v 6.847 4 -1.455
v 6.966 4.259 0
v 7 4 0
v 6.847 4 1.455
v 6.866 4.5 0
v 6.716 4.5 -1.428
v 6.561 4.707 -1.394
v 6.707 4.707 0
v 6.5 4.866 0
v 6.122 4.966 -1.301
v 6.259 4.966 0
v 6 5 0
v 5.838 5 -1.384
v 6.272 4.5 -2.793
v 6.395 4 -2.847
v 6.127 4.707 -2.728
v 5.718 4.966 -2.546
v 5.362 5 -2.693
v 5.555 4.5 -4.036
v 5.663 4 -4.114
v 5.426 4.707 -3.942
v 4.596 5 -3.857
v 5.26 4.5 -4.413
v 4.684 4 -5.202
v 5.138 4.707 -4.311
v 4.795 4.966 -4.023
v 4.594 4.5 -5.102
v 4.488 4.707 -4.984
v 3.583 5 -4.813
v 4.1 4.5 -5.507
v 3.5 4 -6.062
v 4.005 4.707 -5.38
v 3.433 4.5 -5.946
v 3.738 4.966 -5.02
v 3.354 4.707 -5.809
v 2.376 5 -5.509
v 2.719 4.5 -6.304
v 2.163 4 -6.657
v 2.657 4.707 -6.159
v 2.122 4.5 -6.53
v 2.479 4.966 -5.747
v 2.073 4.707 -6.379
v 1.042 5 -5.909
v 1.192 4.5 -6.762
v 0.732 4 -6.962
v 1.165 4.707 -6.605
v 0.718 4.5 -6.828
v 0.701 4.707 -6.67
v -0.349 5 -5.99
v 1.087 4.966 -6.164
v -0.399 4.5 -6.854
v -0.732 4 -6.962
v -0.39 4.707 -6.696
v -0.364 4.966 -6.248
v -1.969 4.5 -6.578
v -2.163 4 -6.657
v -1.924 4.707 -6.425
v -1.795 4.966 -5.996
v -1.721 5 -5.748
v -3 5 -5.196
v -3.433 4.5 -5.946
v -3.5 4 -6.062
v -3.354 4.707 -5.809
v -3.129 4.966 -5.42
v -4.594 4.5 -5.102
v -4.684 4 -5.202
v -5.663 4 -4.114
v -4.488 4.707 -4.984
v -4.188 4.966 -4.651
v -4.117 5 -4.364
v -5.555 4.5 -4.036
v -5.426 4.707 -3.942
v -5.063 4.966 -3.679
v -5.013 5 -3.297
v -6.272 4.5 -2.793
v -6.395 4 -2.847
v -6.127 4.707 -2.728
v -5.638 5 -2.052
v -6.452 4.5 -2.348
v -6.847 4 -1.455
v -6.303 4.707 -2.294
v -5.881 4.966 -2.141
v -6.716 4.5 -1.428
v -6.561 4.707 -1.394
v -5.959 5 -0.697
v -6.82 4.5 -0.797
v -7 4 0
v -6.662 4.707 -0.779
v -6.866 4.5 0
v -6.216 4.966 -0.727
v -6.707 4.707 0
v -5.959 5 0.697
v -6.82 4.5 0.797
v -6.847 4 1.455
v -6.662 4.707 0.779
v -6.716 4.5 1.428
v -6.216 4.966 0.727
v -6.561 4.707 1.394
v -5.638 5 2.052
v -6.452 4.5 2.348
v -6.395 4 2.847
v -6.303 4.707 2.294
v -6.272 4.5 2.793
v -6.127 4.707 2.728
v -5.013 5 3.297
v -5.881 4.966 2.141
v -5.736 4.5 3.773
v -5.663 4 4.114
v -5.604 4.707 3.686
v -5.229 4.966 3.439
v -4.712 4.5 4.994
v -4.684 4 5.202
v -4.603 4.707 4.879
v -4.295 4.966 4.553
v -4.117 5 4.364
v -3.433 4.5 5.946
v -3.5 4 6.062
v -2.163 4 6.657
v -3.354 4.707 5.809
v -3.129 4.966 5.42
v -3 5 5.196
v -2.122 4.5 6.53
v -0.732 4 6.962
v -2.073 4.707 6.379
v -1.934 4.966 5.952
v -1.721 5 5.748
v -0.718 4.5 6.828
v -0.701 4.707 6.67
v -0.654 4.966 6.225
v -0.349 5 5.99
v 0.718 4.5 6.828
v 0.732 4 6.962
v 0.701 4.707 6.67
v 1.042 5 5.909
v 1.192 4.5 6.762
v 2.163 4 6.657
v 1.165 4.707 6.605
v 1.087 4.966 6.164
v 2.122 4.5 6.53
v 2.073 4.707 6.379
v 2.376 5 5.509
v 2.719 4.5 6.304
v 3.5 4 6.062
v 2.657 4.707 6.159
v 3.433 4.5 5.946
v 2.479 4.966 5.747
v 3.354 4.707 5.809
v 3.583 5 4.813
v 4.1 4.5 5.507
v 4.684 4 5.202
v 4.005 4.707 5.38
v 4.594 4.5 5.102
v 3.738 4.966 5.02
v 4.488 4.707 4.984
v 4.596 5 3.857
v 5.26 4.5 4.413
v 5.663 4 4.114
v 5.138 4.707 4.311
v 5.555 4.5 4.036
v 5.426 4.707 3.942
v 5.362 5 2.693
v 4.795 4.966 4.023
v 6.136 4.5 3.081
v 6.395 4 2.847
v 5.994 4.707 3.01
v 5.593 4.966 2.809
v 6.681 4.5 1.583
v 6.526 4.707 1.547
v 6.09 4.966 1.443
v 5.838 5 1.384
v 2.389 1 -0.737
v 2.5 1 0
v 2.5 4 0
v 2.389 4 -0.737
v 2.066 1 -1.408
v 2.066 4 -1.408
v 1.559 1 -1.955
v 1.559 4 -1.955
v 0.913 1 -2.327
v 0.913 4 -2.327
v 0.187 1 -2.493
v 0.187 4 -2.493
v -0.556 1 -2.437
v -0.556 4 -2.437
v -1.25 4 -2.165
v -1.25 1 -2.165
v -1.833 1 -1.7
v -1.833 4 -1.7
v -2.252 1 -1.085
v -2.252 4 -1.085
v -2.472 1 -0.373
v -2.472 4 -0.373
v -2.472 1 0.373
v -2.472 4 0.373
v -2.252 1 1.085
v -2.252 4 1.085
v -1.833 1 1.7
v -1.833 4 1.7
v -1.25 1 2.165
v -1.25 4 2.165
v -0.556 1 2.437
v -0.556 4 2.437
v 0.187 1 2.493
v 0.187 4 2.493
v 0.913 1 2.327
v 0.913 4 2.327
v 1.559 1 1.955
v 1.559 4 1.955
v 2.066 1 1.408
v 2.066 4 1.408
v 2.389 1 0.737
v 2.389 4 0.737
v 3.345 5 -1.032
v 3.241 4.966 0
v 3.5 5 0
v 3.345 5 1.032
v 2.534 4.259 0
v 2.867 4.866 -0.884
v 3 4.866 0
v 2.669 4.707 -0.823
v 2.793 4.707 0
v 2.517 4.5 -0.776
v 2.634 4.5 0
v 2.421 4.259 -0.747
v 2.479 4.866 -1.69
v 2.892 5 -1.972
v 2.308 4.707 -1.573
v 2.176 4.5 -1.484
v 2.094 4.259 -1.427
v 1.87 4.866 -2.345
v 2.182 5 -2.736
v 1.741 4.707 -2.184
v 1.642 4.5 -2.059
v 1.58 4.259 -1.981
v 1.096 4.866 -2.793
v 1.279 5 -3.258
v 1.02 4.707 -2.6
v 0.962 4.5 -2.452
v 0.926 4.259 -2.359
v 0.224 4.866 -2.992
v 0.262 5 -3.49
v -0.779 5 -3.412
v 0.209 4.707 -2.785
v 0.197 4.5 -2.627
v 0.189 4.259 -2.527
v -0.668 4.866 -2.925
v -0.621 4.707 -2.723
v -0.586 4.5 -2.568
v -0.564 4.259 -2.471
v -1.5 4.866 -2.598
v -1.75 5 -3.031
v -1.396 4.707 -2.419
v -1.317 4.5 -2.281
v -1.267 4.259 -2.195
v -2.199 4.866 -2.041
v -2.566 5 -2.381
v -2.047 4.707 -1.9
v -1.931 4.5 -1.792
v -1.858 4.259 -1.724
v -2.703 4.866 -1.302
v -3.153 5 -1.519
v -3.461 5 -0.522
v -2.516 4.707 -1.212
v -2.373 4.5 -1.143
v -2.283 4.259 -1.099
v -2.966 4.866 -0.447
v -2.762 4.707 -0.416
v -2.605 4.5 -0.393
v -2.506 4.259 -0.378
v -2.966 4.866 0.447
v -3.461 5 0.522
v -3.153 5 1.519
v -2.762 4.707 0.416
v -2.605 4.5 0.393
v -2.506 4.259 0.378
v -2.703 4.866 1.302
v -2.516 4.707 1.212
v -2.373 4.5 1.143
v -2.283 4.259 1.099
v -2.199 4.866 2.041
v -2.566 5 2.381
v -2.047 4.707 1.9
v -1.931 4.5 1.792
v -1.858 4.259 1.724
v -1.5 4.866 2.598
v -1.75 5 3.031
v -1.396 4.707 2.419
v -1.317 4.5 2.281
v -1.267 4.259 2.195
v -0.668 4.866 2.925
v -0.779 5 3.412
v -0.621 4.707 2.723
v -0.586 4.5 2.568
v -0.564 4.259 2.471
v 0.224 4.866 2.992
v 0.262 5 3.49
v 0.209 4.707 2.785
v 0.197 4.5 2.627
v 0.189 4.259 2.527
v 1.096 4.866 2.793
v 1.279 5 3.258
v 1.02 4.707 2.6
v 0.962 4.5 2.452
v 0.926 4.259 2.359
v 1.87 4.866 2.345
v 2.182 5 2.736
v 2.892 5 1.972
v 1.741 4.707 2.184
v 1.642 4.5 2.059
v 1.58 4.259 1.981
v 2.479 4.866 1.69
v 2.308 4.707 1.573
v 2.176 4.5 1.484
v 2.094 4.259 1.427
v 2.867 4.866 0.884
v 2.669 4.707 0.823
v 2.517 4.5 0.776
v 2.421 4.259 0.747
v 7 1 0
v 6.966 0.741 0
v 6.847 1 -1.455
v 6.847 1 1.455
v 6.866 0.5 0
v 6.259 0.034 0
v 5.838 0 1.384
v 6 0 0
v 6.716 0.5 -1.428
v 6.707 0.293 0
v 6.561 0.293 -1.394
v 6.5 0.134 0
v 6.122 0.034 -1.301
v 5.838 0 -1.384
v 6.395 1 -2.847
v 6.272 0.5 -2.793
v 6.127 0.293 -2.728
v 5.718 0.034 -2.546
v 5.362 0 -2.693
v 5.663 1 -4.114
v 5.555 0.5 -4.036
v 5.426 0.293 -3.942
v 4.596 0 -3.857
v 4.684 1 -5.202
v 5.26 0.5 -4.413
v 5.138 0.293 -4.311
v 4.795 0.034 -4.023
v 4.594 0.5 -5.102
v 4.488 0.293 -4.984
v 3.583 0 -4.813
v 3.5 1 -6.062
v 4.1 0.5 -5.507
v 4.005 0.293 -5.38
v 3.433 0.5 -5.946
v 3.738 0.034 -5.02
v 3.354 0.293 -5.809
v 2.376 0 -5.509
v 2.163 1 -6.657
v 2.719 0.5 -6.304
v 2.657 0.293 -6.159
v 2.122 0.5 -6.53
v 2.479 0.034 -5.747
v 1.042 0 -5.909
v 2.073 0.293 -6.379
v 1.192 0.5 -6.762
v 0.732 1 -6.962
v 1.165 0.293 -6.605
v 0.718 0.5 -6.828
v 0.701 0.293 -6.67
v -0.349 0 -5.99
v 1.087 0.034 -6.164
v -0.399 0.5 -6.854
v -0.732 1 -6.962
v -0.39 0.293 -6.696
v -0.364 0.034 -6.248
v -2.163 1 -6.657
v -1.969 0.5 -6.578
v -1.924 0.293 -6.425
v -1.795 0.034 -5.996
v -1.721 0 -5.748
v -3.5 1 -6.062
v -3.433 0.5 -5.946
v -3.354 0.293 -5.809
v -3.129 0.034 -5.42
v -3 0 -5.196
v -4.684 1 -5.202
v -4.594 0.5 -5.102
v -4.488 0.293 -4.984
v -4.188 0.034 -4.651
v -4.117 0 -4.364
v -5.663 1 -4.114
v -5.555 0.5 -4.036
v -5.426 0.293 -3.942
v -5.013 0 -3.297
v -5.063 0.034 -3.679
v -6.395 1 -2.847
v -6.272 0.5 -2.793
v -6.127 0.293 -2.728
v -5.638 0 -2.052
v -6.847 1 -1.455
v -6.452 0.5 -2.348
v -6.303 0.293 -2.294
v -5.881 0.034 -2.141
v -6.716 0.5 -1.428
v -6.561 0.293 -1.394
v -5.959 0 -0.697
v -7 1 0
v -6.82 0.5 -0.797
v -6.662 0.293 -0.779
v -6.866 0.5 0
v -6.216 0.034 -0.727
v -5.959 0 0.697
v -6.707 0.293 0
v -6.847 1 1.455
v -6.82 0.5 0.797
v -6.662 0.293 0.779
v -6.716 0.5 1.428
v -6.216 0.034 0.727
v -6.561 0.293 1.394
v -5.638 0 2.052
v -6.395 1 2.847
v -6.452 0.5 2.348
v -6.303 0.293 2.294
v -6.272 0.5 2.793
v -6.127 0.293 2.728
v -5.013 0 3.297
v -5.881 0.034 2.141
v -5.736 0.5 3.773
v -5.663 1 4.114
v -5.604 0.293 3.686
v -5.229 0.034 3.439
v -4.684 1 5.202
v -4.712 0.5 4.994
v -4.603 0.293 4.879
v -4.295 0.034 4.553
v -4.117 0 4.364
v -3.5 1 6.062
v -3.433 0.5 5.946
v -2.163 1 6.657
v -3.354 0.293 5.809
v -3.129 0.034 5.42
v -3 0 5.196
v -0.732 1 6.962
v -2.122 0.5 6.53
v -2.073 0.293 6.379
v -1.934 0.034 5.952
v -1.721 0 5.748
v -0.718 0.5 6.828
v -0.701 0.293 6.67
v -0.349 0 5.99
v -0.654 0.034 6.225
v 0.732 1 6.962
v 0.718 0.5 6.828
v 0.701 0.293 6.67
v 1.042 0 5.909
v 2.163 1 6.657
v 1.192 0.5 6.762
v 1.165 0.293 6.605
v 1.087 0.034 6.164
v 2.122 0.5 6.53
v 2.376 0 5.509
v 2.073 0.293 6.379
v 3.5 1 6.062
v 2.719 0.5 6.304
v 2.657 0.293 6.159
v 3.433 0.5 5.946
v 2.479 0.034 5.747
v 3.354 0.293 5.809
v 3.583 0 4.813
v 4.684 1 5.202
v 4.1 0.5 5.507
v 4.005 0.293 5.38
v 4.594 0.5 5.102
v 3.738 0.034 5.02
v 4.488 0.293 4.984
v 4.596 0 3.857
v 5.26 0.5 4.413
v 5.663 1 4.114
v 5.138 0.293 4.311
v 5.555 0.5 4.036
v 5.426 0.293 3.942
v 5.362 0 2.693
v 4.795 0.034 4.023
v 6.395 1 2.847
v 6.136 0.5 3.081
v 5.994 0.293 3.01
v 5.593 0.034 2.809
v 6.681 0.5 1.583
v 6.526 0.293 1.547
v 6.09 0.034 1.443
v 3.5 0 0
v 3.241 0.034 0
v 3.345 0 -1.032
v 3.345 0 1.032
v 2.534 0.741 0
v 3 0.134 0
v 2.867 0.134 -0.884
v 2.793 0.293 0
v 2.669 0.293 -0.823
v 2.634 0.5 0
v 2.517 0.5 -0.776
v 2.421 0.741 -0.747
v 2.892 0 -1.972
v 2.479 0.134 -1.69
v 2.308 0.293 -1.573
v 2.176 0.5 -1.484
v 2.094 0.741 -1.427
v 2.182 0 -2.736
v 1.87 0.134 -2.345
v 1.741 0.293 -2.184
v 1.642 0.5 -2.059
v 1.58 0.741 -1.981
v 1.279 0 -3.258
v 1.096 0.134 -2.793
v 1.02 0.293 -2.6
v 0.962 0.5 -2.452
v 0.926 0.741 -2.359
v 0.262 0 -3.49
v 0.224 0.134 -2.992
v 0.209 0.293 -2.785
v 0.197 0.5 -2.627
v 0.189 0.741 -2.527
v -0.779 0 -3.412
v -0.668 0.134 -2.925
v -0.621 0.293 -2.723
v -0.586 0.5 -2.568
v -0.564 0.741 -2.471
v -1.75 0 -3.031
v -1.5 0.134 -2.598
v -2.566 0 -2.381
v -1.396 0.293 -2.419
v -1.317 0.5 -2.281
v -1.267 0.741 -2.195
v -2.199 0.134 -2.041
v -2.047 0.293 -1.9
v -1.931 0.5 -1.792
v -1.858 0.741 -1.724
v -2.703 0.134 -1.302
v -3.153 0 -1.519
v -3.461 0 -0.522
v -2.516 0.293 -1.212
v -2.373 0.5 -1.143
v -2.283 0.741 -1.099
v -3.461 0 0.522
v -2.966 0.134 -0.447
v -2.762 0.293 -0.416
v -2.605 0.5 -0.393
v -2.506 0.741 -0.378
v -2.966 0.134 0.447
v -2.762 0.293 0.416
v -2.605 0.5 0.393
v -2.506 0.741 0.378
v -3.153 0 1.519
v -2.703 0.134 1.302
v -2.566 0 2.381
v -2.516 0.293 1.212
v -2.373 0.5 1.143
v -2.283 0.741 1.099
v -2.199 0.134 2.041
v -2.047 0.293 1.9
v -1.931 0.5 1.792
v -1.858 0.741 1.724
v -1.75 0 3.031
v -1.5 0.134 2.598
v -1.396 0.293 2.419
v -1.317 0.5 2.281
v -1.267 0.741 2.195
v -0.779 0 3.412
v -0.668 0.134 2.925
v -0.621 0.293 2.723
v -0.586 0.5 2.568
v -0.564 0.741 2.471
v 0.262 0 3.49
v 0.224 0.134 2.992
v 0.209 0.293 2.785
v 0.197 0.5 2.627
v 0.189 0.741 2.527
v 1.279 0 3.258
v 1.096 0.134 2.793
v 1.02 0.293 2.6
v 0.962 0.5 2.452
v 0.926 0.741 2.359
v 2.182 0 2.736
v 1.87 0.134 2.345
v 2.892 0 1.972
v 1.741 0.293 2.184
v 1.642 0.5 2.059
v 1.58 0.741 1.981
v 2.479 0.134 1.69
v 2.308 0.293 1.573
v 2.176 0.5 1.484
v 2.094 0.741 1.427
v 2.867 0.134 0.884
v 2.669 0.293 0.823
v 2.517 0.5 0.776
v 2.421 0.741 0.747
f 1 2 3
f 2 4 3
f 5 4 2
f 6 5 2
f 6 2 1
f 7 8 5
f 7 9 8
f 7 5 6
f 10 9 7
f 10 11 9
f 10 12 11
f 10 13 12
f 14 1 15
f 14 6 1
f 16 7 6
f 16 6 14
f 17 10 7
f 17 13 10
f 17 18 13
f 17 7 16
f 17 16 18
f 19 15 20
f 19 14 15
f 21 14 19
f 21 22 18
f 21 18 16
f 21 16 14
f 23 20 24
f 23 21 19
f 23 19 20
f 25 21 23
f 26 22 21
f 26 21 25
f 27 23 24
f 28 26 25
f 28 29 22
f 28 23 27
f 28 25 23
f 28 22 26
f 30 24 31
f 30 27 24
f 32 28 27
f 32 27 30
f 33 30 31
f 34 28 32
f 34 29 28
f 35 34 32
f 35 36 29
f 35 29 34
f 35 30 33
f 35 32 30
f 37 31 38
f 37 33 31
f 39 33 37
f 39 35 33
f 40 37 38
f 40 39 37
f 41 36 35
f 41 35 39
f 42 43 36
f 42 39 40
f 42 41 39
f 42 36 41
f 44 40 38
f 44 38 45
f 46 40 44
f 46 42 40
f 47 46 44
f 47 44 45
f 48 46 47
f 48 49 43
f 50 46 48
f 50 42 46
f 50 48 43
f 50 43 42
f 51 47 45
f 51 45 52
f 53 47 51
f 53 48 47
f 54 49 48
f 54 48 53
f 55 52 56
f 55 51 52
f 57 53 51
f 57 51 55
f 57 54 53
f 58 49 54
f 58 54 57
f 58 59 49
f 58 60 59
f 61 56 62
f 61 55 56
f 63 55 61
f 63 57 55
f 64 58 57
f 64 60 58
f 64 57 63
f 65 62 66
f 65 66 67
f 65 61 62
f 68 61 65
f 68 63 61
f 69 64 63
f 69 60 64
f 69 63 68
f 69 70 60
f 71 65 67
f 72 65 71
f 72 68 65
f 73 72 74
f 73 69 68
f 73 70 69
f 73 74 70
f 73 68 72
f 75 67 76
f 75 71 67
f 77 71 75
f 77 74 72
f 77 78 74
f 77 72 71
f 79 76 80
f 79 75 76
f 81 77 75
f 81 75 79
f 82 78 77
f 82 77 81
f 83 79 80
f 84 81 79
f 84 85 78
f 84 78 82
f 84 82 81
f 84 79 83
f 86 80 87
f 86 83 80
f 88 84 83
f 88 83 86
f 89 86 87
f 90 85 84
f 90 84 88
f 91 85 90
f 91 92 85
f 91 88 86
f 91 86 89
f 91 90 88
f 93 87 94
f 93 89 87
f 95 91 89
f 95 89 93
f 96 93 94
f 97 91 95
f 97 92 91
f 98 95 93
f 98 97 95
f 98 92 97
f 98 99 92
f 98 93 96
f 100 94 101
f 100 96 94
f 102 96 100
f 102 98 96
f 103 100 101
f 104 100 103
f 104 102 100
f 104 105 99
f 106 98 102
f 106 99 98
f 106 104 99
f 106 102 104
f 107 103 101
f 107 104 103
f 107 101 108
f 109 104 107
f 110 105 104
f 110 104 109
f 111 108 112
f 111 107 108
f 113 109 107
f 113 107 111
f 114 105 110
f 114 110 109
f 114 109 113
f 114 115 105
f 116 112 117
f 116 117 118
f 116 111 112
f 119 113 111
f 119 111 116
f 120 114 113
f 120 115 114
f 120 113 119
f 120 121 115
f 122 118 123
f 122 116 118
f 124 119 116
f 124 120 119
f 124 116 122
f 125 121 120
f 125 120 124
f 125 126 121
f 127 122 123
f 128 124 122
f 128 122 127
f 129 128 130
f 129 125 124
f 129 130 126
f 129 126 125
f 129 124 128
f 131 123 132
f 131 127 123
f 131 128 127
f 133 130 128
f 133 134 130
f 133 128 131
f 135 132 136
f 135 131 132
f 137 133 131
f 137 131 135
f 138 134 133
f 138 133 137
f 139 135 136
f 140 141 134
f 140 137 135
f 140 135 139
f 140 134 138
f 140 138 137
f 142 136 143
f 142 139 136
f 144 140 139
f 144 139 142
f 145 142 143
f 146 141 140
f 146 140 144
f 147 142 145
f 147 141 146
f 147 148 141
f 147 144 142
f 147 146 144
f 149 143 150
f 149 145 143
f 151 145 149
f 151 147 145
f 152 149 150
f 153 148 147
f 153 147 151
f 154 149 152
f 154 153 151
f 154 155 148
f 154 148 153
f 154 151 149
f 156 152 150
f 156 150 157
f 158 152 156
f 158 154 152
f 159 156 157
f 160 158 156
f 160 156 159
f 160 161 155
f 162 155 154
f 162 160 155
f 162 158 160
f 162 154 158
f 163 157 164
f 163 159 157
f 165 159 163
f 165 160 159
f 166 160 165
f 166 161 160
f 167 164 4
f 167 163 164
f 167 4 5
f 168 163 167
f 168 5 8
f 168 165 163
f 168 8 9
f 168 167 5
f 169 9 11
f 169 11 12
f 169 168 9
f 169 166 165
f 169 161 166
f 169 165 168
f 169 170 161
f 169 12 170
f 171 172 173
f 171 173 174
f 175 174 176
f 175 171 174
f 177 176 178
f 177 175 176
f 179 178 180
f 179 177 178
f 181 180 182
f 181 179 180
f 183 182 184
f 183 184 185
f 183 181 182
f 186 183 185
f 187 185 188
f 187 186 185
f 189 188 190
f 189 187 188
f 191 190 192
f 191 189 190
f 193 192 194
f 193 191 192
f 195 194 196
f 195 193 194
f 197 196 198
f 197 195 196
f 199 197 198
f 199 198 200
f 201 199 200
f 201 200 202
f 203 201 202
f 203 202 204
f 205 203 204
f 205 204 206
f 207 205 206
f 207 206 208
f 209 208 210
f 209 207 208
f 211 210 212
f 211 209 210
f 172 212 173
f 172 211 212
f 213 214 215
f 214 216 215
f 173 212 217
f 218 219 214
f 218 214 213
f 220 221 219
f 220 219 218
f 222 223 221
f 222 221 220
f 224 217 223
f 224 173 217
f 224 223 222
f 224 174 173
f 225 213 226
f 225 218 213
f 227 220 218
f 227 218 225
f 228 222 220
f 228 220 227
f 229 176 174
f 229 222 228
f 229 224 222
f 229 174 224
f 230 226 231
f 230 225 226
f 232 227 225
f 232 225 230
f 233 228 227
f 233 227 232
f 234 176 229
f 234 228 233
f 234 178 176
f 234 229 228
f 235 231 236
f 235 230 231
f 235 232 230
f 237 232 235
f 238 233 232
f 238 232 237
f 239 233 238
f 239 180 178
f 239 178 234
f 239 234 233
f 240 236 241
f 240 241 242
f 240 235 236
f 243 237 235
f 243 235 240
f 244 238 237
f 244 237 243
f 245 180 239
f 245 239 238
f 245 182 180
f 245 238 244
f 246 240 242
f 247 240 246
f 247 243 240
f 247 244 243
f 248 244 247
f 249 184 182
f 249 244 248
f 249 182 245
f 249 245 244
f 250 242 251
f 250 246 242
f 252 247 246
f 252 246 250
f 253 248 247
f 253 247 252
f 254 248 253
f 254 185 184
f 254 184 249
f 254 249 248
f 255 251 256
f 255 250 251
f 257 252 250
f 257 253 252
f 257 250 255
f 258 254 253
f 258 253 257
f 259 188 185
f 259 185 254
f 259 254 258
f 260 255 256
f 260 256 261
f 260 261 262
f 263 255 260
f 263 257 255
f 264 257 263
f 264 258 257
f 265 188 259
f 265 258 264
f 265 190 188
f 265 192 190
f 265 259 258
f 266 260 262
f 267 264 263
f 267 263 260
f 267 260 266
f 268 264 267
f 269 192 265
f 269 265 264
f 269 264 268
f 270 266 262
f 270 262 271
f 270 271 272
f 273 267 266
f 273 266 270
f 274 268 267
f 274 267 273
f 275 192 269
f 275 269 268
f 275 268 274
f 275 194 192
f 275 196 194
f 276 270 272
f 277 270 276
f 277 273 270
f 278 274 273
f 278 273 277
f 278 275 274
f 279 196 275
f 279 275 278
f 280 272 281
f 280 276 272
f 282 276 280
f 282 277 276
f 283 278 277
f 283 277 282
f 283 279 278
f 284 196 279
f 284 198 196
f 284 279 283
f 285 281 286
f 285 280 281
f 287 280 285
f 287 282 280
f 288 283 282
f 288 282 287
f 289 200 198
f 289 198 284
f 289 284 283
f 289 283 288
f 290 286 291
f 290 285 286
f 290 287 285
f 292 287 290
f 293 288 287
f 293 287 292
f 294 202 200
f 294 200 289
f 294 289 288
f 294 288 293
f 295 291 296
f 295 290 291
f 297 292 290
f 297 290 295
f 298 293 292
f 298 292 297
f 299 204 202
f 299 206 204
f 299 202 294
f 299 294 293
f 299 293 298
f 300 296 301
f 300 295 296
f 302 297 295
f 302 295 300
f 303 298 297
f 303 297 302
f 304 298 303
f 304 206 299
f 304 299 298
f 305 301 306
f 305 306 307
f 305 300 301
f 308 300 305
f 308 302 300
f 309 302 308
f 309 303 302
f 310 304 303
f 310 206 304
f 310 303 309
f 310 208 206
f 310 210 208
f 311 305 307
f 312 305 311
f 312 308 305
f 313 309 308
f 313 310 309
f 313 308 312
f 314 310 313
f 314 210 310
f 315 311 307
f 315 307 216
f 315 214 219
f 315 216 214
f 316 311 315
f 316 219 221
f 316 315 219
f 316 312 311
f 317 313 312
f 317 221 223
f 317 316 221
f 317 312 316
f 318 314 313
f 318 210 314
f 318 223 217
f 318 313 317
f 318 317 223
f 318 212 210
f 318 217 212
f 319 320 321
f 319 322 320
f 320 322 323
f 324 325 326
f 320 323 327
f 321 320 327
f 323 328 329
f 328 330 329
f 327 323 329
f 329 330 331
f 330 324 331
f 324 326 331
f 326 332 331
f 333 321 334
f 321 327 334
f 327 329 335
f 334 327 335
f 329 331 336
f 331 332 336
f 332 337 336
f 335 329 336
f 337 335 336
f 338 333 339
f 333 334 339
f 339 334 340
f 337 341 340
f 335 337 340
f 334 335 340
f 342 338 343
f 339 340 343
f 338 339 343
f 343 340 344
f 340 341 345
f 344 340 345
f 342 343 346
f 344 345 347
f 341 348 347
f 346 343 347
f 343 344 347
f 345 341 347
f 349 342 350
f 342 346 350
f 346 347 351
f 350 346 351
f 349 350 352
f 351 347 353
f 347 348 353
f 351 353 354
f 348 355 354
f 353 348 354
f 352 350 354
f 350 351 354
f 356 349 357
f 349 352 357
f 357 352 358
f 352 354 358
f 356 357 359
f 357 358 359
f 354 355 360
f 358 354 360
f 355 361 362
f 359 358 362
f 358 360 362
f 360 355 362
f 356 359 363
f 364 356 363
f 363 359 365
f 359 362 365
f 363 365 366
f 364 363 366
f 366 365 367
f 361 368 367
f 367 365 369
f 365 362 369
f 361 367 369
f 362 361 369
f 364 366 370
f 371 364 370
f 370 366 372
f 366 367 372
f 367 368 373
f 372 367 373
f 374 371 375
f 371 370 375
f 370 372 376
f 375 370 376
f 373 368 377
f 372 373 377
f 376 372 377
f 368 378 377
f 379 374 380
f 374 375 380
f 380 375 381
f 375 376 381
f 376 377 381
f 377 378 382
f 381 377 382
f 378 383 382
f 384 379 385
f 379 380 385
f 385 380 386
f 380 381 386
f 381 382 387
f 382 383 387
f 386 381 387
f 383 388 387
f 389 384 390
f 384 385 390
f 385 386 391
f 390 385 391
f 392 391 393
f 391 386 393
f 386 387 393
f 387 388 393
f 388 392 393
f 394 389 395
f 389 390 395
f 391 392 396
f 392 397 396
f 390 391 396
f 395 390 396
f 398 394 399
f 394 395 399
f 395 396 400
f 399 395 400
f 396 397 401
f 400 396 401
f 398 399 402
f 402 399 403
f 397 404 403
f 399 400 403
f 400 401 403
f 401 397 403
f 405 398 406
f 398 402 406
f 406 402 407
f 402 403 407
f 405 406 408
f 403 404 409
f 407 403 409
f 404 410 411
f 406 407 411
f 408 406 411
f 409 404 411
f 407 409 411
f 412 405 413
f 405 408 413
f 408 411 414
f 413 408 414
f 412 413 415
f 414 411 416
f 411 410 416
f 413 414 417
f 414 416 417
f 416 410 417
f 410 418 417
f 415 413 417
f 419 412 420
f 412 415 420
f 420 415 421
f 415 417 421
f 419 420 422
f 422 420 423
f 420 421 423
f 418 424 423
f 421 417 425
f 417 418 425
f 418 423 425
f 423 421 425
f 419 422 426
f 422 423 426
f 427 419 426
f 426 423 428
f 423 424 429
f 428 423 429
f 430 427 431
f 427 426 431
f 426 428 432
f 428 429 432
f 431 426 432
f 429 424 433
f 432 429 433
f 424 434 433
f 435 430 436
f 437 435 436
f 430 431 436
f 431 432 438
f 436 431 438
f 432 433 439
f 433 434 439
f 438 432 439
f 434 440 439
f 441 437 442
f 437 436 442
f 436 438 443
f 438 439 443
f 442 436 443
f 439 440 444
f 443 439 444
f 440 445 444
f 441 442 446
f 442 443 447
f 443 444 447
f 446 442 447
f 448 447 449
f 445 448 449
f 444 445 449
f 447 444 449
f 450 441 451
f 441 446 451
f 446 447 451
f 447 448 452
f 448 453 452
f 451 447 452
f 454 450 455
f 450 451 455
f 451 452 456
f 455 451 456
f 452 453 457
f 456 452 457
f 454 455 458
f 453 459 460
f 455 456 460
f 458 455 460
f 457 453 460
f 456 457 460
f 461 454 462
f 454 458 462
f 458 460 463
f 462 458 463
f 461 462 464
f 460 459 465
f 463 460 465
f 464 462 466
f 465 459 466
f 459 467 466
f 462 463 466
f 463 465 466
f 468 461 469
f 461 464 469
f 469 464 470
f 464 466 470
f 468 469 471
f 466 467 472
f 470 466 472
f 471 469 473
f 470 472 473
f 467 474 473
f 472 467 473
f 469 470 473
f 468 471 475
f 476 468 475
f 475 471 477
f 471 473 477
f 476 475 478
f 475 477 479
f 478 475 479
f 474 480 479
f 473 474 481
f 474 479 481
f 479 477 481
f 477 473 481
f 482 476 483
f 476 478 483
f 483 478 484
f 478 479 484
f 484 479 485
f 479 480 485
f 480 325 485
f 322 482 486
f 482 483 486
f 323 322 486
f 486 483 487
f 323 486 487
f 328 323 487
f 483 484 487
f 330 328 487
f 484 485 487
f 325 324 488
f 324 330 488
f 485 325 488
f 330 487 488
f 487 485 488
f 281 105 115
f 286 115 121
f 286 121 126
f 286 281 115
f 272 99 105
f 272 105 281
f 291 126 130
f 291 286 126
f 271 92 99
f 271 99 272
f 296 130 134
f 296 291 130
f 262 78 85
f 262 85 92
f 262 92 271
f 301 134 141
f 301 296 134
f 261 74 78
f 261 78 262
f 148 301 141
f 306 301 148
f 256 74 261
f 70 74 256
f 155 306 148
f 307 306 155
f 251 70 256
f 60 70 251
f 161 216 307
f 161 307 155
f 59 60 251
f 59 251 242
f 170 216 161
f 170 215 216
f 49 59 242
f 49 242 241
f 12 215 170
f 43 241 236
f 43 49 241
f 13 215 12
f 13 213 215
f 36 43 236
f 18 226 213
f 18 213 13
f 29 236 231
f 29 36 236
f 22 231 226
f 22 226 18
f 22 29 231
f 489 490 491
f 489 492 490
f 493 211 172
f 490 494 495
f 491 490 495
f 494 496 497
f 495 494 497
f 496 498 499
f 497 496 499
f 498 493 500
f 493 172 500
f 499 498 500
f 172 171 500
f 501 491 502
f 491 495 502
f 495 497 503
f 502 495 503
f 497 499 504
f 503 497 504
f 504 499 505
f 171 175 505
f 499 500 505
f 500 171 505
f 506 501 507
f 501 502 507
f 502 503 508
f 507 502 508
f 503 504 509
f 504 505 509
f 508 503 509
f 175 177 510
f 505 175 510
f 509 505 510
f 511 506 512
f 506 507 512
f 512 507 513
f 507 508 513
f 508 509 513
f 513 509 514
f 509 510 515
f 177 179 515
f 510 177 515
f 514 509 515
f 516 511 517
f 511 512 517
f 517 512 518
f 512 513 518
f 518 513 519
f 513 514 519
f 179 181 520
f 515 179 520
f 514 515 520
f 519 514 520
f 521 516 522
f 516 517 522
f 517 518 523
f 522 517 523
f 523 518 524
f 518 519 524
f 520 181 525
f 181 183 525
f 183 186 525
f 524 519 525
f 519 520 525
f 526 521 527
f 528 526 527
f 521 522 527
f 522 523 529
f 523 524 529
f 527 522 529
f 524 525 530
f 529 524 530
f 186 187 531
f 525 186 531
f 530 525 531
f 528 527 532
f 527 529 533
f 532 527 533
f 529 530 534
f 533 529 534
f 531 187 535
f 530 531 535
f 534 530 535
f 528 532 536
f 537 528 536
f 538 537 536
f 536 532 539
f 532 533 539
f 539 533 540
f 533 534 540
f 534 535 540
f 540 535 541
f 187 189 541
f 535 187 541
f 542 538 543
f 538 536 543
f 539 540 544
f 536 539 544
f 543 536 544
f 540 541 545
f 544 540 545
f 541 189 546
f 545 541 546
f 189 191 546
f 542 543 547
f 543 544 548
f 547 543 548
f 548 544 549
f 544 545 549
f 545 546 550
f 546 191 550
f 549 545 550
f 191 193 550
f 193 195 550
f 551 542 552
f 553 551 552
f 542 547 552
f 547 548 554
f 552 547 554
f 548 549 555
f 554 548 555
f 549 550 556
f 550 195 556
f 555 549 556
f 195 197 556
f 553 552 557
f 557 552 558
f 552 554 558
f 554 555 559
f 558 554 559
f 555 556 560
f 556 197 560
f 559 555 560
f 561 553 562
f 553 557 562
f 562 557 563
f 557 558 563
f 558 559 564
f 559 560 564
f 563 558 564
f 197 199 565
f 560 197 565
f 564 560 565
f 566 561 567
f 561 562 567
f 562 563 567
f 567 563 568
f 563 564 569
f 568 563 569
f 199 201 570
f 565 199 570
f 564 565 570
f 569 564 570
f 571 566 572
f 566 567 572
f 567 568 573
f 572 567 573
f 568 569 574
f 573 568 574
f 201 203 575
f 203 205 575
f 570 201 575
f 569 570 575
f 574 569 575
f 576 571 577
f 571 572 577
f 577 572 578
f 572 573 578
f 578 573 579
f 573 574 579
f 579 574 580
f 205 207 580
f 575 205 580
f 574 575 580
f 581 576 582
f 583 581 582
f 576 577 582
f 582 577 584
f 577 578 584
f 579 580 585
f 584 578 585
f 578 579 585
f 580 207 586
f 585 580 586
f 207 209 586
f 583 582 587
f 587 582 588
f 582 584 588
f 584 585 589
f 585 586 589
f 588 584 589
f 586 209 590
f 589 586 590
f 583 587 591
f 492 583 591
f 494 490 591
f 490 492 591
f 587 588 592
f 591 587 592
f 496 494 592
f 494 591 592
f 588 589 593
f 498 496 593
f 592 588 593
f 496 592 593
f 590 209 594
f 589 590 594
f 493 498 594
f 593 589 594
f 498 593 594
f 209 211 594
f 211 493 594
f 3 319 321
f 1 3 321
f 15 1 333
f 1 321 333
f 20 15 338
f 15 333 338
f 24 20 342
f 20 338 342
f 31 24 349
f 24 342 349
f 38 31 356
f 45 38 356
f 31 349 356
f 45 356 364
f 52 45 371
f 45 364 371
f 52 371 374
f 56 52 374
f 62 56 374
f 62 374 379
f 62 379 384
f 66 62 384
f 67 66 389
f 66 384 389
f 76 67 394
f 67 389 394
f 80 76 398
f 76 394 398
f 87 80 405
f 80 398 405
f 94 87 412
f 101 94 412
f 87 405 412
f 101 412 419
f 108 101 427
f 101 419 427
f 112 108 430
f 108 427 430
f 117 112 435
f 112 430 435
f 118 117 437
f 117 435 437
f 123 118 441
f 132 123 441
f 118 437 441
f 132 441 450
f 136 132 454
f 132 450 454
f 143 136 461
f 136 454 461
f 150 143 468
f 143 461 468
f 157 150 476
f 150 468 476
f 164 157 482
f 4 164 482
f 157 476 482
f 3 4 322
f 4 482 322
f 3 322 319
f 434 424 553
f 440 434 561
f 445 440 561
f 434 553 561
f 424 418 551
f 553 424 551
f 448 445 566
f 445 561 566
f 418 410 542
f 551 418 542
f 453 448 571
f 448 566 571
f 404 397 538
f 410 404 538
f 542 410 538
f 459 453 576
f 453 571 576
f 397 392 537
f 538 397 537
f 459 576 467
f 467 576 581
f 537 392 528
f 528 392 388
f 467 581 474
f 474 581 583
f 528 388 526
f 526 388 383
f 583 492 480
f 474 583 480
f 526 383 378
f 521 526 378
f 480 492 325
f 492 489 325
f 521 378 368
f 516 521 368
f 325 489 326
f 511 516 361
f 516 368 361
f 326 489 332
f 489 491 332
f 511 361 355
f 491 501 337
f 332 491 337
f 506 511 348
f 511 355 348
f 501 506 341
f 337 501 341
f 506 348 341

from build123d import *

# Parameters (mm, degrees)
SKETCH1_R           = 7
SKETCH1_R_2         = 2.5
BOSS_EXTRUDE1_DEPTH = 5
FILLET1_R           = 1
FILLET2_R           = 1


with BuildPart() as part:
    # Sketch1 → Boss-Extrude1 (new body)
    with BuildSketch(Plane(origin=(0, 0, 0), x_dir=(1, 0, 0), z_dir=(0, 1, 0))):
        Circle(SKETCH1_R)
        Circle(SKETCH1_R_2, mode=Mode.SUBTRACT)
    extrude(amount=BOSS_EXTRUDE1_DEPTH)

    # Fillet1
    fillet1_edges = [part.edges().sort_by_distance(p)[0] for p in [
        (-7, 0, 0),
        (-7, 5, 0),
    ]]
    fillet(fillet1_edges, radius=FILLET1_R)

    # Fillet2
    fillet2_edges = [part.edges().sort_by_distance(p)[0] for p in [
        (-2.5, 0, 0),
        (-2.5, 5, 0),
    ]]
    fillet(fillet2_edges, radius=FILLET2_R)


solid = part.part
